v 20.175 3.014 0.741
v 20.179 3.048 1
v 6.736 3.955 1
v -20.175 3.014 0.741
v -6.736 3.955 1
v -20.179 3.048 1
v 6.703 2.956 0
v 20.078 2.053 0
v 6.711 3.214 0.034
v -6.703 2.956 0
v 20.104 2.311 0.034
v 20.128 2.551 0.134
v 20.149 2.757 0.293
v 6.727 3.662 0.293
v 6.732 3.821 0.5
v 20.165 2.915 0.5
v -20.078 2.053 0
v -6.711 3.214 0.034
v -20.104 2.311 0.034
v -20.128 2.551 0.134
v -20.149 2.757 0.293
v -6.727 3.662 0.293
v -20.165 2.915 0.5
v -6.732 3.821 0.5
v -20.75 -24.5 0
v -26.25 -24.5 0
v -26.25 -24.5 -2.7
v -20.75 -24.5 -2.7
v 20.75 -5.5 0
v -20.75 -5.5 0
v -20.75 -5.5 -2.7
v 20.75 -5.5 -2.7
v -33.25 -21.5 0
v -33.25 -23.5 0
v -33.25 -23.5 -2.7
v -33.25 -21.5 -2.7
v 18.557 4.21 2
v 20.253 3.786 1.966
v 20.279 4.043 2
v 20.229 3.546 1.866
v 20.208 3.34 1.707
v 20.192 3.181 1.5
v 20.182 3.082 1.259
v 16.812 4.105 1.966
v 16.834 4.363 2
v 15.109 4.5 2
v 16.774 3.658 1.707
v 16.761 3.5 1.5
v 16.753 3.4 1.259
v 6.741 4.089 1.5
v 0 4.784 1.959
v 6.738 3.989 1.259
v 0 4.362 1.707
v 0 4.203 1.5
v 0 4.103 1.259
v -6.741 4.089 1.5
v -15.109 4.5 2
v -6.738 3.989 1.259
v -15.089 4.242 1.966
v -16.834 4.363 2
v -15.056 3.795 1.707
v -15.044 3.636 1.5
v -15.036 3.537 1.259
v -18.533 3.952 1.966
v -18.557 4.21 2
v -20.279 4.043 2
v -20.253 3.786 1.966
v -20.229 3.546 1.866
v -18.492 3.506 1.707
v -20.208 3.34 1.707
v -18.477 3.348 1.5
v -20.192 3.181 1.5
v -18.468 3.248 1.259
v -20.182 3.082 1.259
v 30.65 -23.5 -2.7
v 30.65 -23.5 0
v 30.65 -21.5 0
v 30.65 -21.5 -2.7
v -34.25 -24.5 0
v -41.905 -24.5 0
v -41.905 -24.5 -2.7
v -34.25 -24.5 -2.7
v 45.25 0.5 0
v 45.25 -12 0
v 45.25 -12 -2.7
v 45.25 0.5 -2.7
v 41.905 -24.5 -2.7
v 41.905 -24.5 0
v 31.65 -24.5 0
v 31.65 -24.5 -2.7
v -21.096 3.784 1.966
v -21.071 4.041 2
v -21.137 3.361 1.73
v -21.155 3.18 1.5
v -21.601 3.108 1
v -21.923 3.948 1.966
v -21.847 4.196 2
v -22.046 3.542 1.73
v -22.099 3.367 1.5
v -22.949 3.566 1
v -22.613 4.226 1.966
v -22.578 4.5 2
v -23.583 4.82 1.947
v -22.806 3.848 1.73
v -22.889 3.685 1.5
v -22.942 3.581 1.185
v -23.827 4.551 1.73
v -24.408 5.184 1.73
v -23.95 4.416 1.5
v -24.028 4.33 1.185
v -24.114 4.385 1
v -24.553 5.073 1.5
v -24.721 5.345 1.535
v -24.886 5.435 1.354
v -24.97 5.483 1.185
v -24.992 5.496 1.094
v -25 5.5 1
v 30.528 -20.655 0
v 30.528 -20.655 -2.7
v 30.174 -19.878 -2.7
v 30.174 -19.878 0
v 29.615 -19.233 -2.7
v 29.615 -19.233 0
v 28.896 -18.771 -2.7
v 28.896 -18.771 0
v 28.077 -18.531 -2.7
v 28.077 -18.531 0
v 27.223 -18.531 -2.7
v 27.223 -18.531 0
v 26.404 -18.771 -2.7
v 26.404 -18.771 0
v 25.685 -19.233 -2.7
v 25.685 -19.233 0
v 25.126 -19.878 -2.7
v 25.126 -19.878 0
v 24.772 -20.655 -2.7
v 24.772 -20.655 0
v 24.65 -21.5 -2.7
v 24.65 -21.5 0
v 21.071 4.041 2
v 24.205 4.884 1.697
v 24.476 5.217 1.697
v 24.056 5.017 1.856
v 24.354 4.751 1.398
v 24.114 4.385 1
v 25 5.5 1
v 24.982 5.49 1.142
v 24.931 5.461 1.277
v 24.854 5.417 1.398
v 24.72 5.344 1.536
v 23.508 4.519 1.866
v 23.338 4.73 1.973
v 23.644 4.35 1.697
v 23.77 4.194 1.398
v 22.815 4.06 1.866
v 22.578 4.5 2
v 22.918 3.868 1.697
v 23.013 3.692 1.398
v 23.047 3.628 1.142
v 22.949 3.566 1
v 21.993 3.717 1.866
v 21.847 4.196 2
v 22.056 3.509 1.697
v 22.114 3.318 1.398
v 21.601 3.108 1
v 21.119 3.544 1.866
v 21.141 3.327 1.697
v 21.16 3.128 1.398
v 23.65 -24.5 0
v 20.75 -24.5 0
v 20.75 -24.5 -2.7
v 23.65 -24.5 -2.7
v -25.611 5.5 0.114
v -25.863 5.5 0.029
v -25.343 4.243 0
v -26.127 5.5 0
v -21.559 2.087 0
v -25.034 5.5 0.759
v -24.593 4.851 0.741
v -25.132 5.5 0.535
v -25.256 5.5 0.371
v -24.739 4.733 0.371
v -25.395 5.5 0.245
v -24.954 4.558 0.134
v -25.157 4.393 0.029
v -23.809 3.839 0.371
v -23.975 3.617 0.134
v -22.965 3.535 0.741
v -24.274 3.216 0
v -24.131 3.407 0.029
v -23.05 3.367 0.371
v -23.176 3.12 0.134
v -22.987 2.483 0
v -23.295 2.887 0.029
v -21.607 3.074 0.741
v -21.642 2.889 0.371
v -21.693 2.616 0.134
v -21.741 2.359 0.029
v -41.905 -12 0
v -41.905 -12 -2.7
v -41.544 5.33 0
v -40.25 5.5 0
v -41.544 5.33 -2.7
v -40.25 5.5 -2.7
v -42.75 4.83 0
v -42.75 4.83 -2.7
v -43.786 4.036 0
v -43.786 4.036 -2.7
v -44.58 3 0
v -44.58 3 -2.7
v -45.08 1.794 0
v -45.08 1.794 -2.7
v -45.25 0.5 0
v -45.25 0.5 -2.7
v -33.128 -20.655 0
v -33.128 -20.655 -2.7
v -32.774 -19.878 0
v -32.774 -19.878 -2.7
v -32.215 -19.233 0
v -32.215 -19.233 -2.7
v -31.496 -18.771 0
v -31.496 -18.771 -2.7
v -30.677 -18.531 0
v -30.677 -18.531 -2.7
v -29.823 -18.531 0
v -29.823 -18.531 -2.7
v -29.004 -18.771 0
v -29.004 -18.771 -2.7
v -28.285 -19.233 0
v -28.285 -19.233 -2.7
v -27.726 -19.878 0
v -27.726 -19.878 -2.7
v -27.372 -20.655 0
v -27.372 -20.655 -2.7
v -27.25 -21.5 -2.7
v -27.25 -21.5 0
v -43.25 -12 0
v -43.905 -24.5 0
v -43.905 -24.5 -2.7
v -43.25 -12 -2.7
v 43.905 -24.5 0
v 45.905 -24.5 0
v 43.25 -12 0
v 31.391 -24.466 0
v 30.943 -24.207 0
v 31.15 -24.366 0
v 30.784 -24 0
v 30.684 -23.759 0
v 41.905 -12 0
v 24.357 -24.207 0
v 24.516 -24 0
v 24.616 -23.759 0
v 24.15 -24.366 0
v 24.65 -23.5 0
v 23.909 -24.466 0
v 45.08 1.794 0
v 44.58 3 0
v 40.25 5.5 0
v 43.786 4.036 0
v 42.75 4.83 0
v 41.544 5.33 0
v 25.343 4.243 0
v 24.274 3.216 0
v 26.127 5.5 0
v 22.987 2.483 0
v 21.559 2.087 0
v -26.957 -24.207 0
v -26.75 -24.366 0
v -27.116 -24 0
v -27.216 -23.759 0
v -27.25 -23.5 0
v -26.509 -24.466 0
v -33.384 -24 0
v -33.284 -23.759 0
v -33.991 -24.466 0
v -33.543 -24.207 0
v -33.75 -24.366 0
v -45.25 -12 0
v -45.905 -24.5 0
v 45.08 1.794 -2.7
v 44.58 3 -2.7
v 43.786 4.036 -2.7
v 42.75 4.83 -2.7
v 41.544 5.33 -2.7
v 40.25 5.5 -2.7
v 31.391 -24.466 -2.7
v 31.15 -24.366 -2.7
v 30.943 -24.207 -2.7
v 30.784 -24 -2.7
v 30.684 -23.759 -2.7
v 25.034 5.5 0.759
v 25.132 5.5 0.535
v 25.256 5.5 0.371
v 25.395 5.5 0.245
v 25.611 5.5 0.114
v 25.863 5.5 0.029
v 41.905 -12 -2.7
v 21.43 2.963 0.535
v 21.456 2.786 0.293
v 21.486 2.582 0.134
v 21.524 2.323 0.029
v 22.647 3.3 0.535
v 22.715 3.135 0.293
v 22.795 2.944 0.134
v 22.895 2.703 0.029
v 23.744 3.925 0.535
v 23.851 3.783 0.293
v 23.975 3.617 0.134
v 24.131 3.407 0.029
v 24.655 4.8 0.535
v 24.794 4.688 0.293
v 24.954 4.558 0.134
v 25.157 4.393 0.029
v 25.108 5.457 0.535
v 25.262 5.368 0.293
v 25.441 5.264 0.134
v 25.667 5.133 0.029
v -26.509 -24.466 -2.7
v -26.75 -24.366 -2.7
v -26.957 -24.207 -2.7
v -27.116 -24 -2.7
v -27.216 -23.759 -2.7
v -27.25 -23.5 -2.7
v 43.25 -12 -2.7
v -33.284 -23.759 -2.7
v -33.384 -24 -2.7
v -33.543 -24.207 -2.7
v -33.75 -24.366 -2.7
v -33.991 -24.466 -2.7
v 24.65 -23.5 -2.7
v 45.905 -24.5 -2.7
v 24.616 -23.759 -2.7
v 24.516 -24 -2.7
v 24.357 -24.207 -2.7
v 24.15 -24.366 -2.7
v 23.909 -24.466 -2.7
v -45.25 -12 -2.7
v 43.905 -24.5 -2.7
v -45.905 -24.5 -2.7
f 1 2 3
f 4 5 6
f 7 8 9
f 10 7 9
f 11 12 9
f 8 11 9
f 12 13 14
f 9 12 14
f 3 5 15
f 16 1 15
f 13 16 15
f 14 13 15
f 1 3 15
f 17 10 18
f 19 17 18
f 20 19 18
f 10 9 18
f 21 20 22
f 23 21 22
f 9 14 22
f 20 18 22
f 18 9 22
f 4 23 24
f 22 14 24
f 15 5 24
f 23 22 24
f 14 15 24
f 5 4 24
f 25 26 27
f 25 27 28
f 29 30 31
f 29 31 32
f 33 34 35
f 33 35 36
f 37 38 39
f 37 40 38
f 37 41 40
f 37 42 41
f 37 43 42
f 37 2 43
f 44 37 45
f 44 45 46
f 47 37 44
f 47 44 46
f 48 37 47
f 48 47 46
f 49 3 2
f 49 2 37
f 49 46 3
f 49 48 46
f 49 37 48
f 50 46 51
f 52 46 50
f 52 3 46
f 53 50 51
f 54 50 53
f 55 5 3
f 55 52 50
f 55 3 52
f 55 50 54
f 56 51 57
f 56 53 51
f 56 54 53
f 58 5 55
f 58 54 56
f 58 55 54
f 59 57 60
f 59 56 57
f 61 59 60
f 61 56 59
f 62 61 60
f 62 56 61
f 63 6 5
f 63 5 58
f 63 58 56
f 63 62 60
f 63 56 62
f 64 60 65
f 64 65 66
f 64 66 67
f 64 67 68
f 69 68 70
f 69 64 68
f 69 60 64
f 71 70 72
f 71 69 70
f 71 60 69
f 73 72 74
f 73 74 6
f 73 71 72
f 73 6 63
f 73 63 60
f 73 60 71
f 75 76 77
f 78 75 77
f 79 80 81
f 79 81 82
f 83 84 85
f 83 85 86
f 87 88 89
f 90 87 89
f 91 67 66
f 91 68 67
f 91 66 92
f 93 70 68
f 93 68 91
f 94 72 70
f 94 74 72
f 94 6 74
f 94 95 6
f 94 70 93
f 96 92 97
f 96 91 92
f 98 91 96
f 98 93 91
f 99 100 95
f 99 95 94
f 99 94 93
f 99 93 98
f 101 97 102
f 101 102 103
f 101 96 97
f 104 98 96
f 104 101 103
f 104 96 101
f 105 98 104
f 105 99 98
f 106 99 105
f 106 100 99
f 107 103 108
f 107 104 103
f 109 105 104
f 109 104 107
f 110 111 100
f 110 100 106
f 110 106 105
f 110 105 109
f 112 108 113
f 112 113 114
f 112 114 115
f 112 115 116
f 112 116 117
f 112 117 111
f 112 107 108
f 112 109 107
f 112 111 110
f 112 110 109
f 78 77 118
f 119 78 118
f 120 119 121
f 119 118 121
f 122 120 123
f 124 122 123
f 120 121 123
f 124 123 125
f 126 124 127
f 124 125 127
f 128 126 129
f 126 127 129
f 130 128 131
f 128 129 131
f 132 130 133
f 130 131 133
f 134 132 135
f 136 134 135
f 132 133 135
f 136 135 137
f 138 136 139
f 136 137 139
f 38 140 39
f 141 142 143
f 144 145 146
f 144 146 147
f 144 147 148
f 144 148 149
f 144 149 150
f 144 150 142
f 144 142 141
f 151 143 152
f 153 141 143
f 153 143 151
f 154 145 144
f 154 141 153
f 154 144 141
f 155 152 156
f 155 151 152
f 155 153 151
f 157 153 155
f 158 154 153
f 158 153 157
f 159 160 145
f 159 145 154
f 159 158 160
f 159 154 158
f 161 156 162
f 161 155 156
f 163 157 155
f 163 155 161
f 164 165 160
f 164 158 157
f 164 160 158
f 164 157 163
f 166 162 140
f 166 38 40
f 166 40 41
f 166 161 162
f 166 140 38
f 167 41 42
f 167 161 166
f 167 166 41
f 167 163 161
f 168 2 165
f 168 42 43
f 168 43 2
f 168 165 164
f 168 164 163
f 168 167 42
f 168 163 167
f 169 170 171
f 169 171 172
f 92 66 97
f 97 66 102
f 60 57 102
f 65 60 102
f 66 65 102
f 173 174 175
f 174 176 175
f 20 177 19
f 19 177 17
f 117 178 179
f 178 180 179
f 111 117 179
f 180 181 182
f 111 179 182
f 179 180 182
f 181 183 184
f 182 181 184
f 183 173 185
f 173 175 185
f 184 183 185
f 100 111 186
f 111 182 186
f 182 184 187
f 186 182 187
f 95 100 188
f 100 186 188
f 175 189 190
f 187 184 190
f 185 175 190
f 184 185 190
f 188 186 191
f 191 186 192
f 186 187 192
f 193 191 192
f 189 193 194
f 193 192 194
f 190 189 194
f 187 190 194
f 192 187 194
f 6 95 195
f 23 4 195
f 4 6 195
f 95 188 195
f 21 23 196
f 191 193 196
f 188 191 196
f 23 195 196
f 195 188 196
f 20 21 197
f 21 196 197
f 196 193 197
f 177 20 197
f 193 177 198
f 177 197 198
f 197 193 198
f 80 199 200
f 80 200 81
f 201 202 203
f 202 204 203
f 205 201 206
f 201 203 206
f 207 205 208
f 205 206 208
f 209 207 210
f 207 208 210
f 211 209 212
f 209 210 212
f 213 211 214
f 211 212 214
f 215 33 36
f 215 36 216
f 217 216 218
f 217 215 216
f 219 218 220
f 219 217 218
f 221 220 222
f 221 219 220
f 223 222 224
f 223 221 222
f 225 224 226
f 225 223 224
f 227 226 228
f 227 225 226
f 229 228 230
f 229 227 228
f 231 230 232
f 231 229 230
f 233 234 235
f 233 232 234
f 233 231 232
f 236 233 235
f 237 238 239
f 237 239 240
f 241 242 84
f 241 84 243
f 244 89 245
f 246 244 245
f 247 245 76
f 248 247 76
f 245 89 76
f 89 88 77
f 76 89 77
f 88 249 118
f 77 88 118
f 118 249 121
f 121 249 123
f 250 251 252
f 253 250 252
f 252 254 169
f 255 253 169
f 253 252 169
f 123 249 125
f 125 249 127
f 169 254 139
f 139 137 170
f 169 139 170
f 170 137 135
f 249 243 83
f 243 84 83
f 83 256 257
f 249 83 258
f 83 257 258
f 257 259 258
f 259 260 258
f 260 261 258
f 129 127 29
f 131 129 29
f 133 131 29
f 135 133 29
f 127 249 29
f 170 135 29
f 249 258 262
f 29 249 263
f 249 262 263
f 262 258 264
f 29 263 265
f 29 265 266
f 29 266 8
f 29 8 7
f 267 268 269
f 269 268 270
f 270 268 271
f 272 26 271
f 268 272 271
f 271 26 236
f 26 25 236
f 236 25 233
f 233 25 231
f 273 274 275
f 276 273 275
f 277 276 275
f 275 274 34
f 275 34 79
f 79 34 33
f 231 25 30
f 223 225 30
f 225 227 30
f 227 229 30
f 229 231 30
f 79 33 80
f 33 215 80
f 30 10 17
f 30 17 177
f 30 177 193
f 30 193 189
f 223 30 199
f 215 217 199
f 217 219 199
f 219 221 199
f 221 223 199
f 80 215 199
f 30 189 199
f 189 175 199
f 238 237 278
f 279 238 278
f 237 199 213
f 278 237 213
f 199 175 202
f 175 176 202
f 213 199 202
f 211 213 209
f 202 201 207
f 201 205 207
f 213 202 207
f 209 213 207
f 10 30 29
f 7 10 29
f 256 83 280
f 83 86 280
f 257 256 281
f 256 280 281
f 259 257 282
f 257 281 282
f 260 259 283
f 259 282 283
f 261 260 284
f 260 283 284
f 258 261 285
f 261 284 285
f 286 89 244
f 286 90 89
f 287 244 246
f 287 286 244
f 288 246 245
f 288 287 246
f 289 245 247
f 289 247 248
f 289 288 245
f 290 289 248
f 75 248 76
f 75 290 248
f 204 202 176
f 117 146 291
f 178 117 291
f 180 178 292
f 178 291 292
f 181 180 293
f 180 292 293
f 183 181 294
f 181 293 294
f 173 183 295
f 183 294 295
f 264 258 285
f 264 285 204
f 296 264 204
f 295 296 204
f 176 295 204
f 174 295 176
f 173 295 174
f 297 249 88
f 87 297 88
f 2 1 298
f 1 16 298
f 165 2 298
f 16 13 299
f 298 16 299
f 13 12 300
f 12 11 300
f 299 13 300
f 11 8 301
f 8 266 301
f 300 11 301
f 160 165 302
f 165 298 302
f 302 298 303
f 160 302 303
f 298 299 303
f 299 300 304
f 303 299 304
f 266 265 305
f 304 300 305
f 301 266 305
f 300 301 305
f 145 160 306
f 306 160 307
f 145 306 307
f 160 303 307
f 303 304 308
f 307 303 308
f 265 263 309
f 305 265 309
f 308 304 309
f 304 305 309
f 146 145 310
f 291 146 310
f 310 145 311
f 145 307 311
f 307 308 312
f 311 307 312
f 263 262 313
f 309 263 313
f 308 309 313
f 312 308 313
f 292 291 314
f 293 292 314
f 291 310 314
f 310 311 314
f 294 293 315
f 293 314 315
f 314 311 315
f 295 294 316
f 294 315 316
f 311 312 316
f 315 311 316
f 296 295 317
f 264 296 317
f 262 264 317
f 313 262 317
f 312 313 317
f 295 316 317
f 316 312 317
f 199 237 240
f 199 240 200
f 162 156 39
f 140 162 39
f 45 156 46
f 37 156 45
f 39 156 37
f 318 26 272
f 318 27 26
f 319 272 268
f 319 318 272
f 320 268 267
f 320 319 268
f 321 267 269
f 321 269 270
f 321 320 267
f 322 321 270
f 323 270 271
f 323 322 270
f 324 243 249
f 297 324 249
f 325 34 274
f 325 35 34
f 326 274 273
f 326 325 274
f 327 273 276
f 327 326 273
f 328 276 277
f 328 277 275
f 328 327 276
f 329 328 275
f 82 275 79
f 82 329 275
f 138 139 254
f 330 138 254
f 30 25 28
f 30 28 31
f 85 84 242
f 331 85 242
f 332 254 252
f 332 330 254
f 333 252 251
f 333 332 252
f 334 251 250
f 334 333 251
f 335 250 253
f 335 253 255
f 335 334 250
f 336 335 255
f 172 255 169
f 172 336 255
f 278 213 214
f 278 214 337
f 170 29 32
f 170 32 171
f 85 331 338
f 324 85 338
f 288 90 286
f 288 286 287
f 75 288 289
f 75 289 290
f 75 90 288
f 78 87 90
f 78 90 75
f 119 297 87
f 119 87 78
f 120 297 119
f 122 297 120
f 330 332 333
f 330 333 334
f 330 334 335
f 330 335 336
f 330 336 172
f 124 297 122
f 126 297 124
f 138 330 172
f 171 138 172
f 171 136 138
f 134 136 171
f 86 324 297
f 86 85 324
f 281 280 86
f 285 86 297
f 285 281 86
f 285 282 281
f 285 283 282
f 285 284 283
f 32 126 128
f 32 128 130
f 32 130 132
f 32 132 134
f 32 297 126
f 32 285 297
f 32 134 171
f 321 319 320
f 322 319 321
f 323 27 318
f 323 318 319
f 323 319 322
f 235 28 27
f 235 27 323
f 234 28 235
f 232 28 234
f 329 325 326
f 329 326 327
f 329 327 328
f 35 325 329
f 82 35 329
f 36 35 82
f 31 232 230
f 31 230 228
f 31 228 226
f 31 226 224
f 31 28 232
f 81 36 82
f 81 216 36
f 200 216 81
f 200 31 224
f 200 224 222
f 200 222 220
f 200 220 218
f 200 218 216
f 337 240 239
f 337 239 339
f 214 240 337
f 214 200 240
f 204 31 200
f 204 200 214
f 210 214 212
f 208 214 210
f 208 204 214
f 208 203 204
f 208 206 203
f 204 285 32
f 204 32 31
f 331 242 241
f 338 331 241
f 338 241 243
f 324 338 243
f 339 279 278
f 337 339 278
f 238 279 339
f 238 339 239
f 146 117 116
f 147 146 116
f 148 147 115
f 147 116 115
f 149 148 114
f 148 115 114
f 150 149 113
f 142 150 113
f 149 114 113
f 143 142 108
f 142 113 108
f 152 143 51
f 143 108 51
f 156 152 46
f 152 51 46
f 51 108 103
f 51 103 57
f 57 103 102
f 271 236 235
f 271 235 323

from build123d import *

# Parameters (mm, degrees)
BOSS_EXTRUDE1_DEPTH  = 2.7
FILLET1_R            = 5
BOSS_EXTRUDE2_DEPTH  = 2
FILLET2_R            = 5
FILLET3_R            = 1
FASTENER_HOLES_DEPTH = 52.527686738
FILLET4_R            = 1
WEDGE_DEPTH          = 2.7
CUT_EXTRUDE2_DEPTH   = 53.103914951


with BuildPart() as part:
    # Sketch1 → Boss-Extrude1 (new body)
    with BuildSketch(Plane.XY):
        Polygon((-20.75, -5.5), (20.75, -5.5), (20.75, -24.5), (45.25, -24.5), (45.25, -5.5), (45.25, 5.5), (-45.25, 5.5), (-45.25, -5.5), (-45.25, -24.5), (-20.75, -24.5), align=None)
    extrude(amount=-BOSS_EXTRUDE1_DEPTH)

    # Fillet1
    fillet1_edges = [part.edges().sort_by_distance(p)[0] for p in [
        (-45.25, 5.5, -1.35),
        (45.25, 5.5, -1.35),
    ]]
    fillet(fillet1_edges, radius=FILLET1_R)

    # Sketch2 → Boss-Extrude2 (add)
    with BuildSketch(Plane.XY):
        with BuildLine():
            Line((-25, 5.5), (25, 5.5))
            Line((25, 5.5), (25, 2.5))
            ThreePointArc((25, 2.5), (0, 4.06865167), (-25, 2.5))
            Line((-25, 2.5), (-25, 5.5))
        make_face()
    extrude(amount=BOSS_EXTRUDE2_DEPTH)

    # Fillet2
    # the kernel refuses this fillet: 5 mm, written as the material it takes off along each edge
    with BuildSketch(Plane(origin=(-25, 2.5, 0), x_dir=(0, 1, 0), z_dir=(0, 0, 1))) as fillet2_piece_1:
        with BuildLine():
            CenterArc((5.522601094, -4.316999388), FILLET2_R, 120.299508601, 65.491069006)
            ThreePointArc((0.548114523, -4.821462818), (0.288680447, -2.409069013), (0, 0))
            Line((0, 0), (3, 0))
        make_face()
    extrude(amount=14.131295591, mode=Mode.SUBTRACT)
    with BuildSketch(Plane(origin=(25, 2.5, 0), x_dir=(-0.9936001438850942, 0.11295465493515582, 0), z_dir=(0, 0, 1))) as fillet2_piece_2:
        with BuildLine():
            CenterArc((4.913174714, -4.999632066), FILLET2_R, 90.695089087, 65.491069006)
            Line((0.338863965, -2.980800432), (0, 0))
            ThreePointArc((0, 0), (2.426259118, -0.014717375), (4.852518236, 0))
        make_face()
    extrude(amount=14.131295591, mode=Mode.SUBTRACT)

    # Fillet3
    # the kernel refuses this fillet: 1 mm, written as the material it adds along each edge
    with BuildSketch(Plane(origin=(20.683000612, 8.022601094, 0), x_dir=(-0.10089268591027718, -0.9948973142640452, 0), z_dir=(-0.9948973142640452, 0.10089268591027718, 0))) as fillet3_piece_1_section:
        with BuildLine():
            CenterArc((5 + FILLET3_R, FILLET3_R), FILLET3_R, 180, 90)
            Line((5, FILLET3_R), (5, 0))
            Line((5, 0), (5 + FILLET3_R, 0))
        make_face()
    fillet3_piece_1 = revolve(axis=Axis((20.683000612, 8.022601094, 0), (0, 0, 1)), revolution_arc=94.145051676, mode=Mode.PRIVATE)
    fillet3_piece_1 = split(fillet3_piece_1, bisect_by=Plane(origin=(23.299245225, 5.5, 0.284698162), z_dir=(0, -1, 0)), keep=Keep.TOP, mode=Mode.PRIVATE)
    add(fillet3_piece_1)
    with BuildSketch(Plane(origin=(0, -195.93134833, 0), x_dir=(0.1008926859104223, 0.9948973142640303, 0), z_dir=(0.9948973142640303, -0.1008926859104223, 0))) as fillet3_piece_2:
        with BuildLine():
            CenterArc((200 - FILLET3_R, FILLET3_R), FILLET3_R, 270, 90)
            Line((200, FILLET3_R), (200, 0))
            Line((200, 0), (200 - FILLET3_R, 0))
        make_face()
    revolve(axis=Axis((0, -195.93134833, 0), (0, 0, 1)), revolution_arc=11.581155214)
    with BuildSketch(Plane(origin=(-20.683000612, 8.022601094, 0), x_dir=(-0.999587613586136, -0.028715897429362498, 0), z_dir=(-0.028715897429362498, 0.999587613586136, 0))) as fillet3_piece_3_section:
        with BuildLine():
            CenterArc((5 + FILLET3_R, FILLET3_R), FILLET3_R, 180, 90)
            Line((5, FILLET3_R), (5, 0))
            Line((5, 0), (5 + FILLET3_R, 0))
        make_face()
    fillet3_piece_3 = revolve(axis=Axis((-20.683000612, 8.022601094, 0), (0, 0, 1)), revolution_arc=94.145051676, mode=Mode.PRIVATE)
    fillet3_piece_3 = split(fillet3_piece_3, bisect_by=Plane(origin=(-23.299245227, 5.5, 0.284698166), z_dir=(0, -1, 0)), keep=Keep.TOP, mode=Mode.PRIVATE)
    add(fillet3_piece_3)
    # the kernel refuses this fillet: 1 mm, written as the material it takes off along each edge
    with BuildSketch(Plane(origin=(20.683000612, 8.022601094, 2), x_dir=(0.9995876135861396, -0.028715897429238708, 0), z_dir=(0.028715897429238708, 0.9995876135861396, 0))) as fillet3_2_piece_1:
        with BuildLine():
            CenterArc((5 - FILLET3_R, FILLET3_R), FILLET3_R, 270, 90)
            Line((5, FILLET3_R), (5, 0))
            Line((5, 0), (5 - FILLET3_R, 0))
        make_face()
    revolve(axis=Axis((20.683000612, 8.022601094, 2), (0, 0, -1)), revolution_arc=94.145051676, mode=Mode.SUBTRACT)
    with BuildSketch(Plane(origin=(0, -195.93134833, 2), x_dir=(0.10089268591041367, 0.9948973142640313, 0), z_dir=(0.9948973142640313, -0.10089268591041367, 0))) as fillet3_2_piece_2:
        with BuildLine():
            CenterArc((200 + FILLET3_R, -FILLET3_R), FILLET3_R, 90, 90)
            Line((200, -FILLET3_R), (200, 0))
            Line((200, 0), (200 + FILLET3_R, 0))
        make_face()
    revolve(axis=Axis((0, -195.93134833, 2), (0, 0, 1)), revolution_arc=11.581155214, mode=Mode.SUBTRACT)
    with BuildSketch(Plane(origin=(-20.683000612, 8.022601094, 2), x_dir=(0.10089268591039939, -0.9948973142640327, 0), z_dir=(0.9948973142640327, 0.10089268591039939, 0))) as fillet3_2_piece_3:
        with BuildLine():
            CenterArc((5 - FILLET3_R, FILLET3_R), FILLET3_R, 270, 90)
            Line((5 - FILLET3_R, 0), (5, 0))
            Line((5, 0), (5, FILLET3_R))
        make_face()
    revolve(axis=Axis((-20.683000612, 8.022601094, 2), (0, 0, -1)), revolution_arc=94.145051676, mode=Mode.SUBTRACT)
    with BuildSketch(Plane(origin=(-27.5, 5.5, 2), x_dir=(0, 0, -1), z_dir=(1, 0, 0))) as fillet3_2_piece_4:
        with BuildLine():
            CenterArc((FILLET3_R, -FILLET3_R), FILLET3_R, 90, 90)
            Line((0, -FILLET3_R), (0, 0))
            Line((0, 0), (FILLET3_R, 0))
        make_face()
    extrude(amount=55, mode=Mode.SUBTRACT)

    # Sketch3 → Fastener holes (cut, through all)
    with BuildSketch(Plane.XY):
        with BuildLine():
            Line((-33.25, -24.5), (-33.25, -21.5))
            ThreePointArc((-33.25, -21.5), (-30.25, -18.5), (-27.25, -21.5))
            Line((-27.25, -21.5), (-27.25, -24.5))
            ThreePointArc((-27.25, -24.5), (-30.25, -27.5), (-33.25, -24.5))
        make_face()
        with BuildLine():
            Line((30.65, -24.5), (30.65, -21.5))
            ThreePointArc((30.65, -21.5), (27.65, -18.5), (24.65, -21.5))
            Line((24.65, -21.5), (24.65, -24.5))
            ThreePointArc((24.65, -24.5), (27.65, -27.5), (30.65, -24.5))
        make_face()
    extrude(amount=-FASTENER_HOLES_DEPTH, mode=Mode.SUBTRACT)

    # Fillet4
    fillet4_edges = [part.edges().sort_by_distance(p)[0] for p in [
        (-27.25, -24.5, -1.35),
        (-33.25, -24.5, -1.35),
        (30.65, -24.5, -1.35),
        (24.65, -24.5, -1.35),
    ]]
    fillet(fillet4_edges, radius=FILLET4_R)

    # Sketch4 → Wedge (add)
    with BuildSketch(Plane.XY):
        Polygon((45.25, -12), (45.905097241, -24.5), (45.25, -24.5), align=None)
        Polygon((-45.25, -12), (-45.25, -24.5), (-45.905097241, -24.5), align=None)
    extrude(amount=-WEDGE_DEPTH)

    # Sketch5 → Cut-Extrude2 (cut, through all)
    with BuildSketch(Plane.XY):
        Polygon((43.905097241, -24.5), (43.25, -12), (41.905097241, -12), (41.905097241, -24.5), align=None)
        Polygon((-41.905097241, -24.5), (-43.905097241, -24.5), (-43.25, -12), (-41.905097241, -12), align=None)
    extrude(amount=-CUT_EXTRUDE2_DEPTH, mode=Mode.SUBTRACT)


solid = part.part
